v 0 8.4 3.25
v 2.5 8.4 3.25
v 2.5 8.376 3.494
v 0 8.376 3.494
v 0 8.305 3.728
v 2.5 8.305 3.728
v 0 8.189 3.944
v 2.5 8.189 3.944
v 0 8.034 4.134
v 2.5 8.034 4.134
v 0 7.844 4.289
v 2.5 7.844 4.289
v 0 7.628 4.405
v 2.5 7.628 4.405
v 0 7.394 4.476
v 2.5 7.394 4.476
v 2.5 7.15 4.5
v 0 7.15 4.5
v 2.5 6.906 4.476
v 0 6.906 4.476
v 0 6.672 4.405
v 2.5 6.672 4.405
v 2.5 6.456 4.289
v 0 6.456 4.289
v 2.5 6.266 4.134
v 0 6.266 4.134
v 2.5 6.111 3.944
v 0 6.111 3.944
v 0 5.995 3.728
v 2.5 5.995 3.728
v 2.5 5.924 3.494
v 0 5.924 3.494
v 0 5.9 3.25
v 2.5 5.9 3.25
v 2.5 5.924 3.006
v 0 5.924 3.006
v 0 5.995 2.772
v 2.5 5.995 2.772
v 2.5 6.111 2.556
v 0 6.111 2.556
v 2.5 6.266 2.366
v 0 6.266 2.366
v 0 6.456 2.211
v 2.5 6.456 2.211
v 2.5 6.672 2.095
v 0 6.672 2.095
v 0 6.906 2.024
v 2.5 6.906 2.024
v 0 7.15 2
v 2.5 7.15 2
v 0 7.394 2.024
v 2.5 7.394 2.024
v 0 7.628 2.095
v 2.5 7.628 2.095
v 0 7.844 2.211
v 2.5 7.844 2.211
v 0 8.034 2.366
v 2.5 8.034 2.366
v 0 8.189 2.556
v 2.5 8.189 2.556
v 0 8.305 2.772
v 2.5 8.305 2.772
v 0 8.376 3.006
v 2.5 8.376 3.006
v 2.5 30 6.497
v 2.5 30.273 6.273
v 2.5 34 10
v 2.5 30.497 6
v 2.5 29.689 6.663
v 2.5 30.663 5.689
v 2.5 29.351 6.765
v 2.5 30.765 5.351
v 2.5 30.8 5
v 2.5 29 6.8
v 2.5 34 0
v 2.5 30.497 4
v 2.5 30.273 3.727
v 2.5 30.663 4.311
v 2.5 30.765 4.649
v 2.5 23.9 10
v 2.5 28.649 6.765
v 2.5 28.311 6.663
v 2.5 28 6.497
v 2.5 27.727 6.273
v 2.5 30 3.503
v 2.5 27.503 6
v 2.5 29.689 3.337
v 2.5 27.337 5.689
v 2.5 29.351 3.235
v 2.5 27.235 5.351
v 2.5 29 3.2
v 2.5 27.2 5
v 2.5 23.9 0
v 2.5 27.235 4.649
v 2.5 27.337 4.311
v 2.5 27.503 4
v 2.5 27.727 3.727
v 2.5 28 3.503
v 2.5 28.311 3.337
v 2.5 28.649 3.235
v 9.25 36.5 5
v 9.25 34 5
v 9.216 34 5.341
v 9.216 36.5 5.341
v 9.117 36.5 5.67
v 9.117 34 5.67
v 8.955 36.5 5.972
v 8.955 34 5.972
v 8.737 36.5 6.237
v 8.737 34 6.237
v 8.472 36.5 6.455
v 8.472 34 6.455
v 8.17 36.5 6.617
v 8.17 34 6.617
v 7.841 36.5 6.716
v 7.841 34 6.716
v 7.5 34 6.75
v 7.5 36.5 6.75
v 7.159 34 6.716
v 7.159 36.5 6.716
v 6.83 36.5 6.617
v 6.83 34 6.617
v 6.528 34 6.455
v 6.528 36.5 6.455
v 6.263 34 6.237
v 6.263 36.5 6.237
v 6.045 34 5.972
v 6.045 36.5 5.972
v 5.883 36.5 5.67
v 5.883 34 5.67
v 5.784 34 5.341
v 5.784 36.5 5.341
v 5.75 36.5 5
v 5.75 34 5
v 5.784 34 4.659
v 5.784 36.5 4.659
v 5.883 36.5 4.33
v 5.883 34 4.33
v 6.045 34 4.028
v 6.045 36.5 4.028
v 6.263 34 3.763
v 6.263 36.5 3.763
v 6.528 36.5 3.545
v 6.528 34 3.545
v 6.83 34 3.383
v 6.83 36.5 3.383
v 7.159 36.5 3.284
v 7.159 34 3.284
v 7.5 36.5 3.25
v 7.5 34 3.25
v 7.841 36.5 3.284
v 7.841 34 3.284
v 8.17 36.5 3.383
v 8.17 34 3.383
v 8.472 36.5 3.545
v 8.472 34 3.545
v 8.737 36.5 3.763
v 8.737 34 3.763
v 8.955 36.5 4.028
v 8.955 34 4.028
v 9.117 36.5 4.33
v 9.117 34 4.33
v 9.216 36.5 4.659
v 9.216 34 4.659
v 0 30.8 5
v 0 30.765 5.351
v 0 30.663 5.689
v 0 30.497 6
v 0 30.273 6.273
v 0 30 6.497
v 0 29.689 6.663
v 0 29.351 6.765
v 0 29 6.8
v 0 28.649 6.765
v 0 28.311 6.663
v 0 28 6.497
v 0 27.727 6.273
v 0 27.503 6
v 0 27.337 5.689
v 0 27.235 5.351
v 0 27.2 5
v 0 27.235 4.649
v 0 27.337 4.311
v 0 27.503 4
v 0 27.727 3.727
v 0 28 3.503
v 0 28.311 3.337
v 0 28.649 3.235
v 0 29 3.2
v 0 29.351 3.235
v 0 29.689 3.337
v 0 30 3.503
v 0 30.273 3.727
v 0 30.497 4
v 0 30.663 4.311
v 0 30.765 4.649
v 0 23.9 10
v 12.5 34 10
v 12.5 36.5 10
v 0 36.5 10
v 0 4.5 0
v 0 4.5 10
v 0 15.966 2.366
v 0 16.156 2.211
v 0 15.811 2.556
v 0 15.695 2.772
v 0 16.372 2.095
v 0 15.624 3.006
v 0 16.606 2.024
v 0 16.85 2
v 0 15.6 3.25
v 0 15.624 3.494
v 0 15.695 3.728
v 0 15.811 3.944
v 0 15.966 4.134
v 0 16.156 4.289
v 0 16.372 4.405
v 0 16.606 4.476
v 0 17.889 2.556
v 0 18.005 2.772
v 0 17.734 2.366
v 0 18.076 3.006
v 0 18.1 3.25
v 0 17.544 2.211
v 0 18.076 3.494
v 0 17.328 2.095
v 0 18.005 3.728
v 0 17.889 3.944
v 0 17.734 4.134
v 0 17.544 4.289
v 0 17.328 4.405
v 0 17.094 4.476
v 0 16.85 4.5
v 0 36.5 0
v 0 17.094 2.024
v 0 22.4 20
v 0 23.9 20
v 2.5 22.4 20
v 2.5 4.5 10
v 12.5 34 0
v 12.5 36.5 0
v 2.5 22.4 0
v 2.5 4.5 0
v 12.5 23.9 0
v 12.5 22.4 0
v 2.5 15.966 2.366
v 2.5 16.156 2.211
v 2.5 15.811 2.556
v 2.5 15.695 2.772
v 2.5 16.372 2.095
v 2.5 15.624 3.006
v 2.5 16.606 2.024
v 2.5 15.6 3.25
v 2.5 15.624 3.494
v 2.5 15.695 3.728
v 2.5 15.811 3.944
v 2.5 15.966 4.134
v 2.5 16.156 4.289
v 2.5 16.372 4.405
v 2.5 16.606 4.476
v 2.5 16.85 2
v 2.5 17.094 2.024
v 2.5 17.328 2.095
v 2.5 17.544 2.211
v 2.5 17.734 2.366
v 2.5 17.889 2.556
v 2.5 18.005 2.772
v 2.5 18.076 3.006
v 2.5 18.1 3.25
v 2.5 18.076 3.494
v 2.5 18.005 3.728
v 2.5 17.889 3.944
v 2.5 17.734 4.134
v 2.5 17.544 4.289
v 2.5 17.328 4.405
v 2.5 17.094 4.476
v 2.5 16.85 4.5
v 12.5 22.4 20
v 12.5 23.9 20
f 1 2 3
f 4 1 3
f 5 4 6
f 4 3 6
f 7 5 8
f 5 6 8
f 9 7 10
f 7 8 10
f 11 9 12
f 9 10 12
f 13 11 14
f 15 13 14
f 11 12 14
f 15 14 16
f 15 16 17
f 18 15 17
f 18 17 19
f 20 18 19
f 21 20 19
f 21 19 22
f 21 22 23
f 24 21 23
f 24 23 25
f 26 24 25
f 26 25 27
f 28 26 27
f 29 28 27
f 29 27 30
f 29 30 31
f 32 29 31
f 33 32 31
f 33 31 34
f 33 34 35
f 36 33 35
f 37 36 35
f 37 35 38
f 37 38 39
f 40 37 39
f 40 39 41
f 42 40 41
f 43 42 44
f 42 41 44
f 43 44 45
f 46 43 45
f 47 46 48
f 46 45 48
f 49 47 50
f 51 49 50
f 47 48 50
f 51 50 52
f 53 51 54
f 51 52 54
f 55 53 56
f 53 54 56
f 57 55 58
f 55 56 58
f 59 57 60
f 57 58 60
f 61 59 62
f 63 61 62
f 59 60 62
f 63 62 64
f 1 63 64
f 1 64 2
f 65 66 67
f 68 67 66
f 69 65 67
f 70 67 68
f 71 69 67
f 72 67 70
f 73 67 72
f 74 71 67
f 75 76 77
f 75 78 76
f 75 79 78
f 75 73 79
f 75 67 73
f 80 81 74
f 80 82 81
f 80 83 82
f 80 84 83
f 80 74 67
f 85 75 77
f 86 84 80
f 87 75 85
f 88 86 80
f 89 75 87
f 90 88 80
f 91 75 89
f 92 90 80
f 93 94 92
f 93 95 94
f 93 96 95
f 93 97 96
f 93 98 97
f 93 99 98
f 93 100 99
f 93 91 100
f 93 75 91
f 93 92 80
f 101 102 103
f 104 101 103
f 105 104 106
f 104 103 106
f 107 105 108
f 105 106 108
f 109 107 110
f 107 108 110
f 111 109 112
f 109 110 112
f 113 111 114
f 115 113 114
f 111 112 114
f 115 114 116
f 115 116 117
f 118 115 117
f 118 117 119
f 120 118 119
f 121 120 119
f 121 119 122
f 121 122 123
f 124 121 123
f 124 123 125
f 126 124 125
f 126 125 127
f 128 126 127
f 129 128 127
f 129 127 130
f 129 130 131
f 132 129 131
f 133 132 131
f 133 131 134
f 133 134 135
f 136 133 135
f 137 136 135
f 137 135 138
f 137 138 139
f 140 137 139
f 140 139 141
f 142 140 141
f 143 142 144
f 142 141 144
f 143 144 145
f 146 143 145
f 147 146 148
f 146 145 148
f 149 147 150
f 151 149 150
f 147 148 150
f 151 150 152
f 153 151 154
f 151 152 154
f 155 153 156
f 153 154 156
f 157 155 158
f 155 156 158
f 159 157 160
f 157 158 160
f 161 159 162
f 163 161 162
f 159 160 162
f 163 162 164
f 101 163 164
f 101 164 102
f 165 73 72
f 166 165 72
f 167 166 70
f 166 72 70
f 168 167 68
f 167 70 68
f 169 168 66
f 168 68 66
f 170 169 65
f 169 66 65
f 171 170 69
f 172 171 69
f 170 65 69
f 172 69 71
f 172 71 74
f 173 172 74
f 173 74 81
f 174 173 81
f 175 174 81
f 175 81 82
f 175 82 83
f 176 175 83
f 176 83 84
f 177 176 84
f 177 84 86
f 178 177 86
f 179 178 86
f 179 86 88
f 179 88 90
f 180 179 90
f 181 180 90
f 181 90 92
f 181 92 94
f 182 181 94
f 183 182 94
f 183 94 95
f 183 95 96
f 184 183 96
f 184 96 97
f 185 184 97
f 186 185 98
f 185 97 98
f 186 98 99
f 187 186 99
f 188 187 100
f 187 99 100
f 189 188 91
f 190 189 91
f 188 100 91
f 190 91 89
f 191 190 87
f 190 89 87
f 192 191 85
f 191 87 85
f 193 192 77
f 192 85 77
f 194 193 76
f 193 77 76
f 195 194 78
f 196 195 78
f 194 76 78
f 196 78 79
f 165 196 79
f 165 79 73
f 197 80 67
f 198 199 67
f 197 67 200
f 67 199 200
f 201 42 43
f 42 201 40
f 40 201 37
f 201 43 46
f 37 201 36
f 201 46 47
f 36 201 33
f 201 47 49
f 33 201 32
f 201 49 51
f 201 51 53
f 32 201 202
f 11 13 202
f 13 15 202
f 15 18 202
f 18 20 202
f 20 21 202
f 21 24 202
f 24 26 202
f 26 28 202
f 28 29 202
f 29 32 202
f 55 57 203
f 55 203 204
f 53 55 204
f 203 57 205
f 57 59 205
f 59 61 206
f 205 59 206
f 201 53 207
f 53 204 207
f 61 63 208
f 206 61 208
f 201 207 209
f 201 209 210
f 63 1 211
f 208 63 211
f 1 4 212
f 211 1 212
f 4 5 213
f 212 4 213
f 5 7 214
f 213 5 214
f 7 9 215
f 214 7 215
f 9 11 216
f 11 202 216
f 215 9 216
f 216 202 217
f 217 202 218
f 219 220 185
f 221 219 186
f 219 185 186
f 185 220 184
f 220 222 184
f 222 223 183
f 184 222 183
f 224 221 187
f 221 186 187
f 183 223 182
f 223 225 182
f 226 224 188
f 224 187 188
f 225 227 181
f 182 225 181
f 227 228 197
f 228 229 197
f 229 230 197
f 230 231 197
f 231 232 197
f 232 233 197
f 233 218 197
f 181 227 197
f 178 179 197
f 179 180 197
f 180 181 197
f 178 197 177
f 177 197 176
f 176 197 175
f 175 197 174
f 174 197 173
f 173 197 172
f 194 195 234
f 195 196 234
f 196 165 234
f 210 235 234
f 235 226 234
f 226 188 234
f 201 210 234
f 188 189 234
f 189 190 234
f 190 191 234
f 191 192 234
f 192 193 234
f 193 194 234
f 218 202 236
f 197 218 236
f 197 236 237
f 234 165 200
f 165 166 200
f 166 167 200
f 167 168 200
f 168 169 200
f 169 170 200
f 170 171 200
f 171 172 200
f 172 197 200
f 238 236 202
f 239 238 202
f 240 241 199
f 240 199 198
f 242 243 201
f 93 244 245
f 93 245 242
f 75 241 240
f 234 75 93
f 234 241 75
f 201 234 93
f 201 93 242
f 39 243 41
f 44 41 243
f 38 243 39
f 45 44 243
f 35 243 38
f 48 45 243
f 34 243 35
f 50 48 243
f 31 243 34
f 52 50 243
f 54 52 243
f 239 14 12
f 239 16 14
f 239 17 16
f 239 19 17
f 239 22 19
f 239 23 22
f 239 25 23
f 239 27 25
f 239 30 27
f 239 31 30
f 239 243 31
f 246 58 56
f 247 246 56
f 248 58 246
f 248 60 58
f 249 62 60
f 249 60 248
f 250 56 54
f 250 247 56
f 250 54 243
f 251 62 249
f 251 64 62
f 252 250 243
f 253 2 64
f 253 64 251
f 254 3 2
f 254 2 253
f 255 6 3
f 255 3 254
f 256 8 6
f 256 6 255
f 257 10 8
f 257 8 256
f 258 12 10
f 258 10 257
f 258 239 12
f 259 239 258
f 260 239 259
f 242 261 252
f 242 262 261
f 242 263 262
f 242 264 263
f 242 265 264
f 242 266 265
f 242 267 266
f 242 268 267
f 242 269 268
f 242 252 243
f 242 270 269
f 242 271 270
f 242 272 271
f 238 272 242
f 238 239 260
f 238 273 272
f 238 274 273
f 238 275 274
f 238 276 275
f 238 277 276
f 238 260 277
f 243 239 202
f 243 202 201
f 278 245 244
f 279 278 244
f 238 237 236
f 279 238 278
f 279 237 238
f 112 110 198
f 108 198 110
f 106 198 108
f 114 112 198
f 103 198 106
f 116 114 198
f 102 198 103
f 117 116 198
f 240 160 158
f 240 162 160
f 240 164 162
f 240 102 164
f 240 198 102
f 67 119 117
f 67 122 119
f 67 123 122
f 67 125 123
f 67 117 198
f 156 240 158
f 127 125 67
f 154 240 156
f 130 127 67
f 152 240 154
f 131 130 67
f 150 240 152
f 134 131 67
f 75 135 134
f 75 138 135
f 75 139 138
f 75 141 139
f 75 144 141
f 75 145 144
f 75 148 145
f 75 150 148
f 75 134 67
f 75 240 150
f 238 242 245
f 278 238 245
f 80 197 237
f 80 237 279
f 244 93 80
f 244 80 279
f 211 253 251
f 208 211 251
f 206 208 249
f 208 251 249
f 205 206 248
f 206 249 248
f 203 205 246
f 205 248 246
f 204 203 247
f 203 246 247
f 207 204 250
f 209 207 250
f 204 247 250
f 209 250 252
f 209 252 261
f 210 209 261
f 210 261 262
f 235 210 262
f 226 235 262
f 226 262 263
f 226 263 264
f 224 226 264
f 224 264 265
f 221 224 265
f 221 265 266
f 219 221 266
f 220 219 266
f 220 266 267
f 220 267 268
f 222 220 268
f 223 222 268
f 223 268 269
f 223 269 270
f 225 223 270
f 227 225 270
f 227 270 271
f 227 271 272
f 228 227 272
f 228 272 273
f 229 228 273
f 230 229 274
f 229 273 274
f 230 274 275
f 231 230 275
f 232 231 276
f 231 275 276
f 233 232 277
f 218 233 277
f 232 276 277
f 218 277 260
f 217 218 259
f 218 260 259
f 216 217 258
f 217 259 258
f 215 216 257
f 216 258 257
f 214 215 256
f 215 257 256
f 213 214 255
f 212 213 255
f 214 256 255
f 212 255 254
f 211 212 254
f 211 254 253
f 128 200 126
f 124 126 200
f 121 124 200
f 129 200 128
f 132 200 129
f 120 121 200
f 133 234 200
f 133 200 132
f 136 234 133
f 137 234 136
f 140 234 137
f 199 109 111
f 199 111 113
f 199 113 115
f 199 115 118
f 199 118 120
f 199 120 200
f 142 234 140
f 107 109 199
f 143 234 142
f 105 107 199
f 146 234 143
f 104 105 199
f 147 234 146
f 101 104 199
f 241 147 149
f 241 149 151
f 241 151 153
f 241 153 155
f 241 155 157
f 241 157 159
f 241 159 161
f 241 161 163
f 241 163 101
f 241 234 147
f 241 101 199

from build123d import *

# Parameters (mm, degrees)
BOSS_EXTRUDE1_DEPTH      = 10
SKETCH2_R                = 1.75
CUT_EXTRUDE1_DEPTH       = 10
SKETCH3_R                = 1.25
SKETCH3_R_2              = 1.8
CUT_EXTRUDE2_DEPTH       = 40.143965052
SKETCH4_W                = 13.022509218
SKETCH4_H                = 4.5
CUT_EXTRUDE3_DEPTH       = 40.143965052
BOSS_EXTRUDE2_DEPTH      = 10
BOSS_EXTRUDE2_DEPTH_BACK = 10
SKETCH5_W                = 12.5
SKETCH5_H                = 1.5
LOFT2_DEPTH              = 2.5


# Read off the part's stored shape, not the designer's step: Loft2
with BuildPart() as part:
    # Sketch1 → Boss-Extrude1 (new body)
    with BuildSketch(Plane.XY):
        Polygon((0, 0), (0, 36.5), (12.5, 36.5), (12.5, 34), (2.5, 34), (2.5, 0), align=None)
    extrude(amount=BOSS_EXTRUDE1_DEPTH)

    # Sketch2 → Cut-Extrude1 (cut)
    with BuildSketch(Plane.XZ.offset(-34)):
        with Locations((7.5, 5)):
            Circle(SKETCH2_R)
    extrude(amount=-CUT_EXTRUDE1_DEPTH, mode=Mode.SUBTRACT)

    # Sketch3 → Cut-Extrude2 (cut, through all)
    with BuildSketch(Plane(origin=(2.5, 0, 0), x_dir=(0, 0, -1), z_dir=(1, 0, 0))):
        with Locations(Location((-3.25, 7.15, 0), (0, 0, 90))):
            Circle(SKETCH3_R)
        with Locations(Location((-3.25, 16.85, 0), (0, 0, 270))):
            Circle(SKETCH3_R)
        with Locations(Location((-5, 29, 0), (0, 0, 90))):
            Circle(SKETCH3_R_2)
    extrude(amount=-CUT_EXTRUDE2_DEPTH, mode=Mode.SUBTRACT)

    # Sketch4 → Cut-Extrude3 (cut, through all)
    with BuildSketch(Plane(origin=(2.5, 0, 0), x_dir=(0, 0, -1), z_dir=(1, 0, 0))):
        with Locations((-6.511254609, 2.25)):
            Rectangle(SKETCH4_W, SKETCH4_H)
    extrude(amount=-CUT_EXTRUDE3_DEPTH, mode=Mode.SUBTRACT)

    # Sketch5 → Boss-Extrude2 (add, two sides: drawn at the far end of the back side and taken through both)
    with BuildSketch(Plane.XY.offset(10).offset(-BOSS_EXTRUDE2_DEPTH_BACK)):
        with Locations((6.25, 23.15)):
            Rectangle(SKETCH5_W, SKETCH5_H)
    extrude(amount=BOSS_EXTRUDE2_DEPTH + BOSS_EXTRUDE2_DEPTH_BACK)

    # Loft2 outline → Loft2 (add)
    with BuildSketch(Plane.YZ):
        Polygon((22.4, 10), (22.4, 20), (4.5, 10), align=None)
    extrude(amount=LOFT2_DEPTH)


solid = part.part
